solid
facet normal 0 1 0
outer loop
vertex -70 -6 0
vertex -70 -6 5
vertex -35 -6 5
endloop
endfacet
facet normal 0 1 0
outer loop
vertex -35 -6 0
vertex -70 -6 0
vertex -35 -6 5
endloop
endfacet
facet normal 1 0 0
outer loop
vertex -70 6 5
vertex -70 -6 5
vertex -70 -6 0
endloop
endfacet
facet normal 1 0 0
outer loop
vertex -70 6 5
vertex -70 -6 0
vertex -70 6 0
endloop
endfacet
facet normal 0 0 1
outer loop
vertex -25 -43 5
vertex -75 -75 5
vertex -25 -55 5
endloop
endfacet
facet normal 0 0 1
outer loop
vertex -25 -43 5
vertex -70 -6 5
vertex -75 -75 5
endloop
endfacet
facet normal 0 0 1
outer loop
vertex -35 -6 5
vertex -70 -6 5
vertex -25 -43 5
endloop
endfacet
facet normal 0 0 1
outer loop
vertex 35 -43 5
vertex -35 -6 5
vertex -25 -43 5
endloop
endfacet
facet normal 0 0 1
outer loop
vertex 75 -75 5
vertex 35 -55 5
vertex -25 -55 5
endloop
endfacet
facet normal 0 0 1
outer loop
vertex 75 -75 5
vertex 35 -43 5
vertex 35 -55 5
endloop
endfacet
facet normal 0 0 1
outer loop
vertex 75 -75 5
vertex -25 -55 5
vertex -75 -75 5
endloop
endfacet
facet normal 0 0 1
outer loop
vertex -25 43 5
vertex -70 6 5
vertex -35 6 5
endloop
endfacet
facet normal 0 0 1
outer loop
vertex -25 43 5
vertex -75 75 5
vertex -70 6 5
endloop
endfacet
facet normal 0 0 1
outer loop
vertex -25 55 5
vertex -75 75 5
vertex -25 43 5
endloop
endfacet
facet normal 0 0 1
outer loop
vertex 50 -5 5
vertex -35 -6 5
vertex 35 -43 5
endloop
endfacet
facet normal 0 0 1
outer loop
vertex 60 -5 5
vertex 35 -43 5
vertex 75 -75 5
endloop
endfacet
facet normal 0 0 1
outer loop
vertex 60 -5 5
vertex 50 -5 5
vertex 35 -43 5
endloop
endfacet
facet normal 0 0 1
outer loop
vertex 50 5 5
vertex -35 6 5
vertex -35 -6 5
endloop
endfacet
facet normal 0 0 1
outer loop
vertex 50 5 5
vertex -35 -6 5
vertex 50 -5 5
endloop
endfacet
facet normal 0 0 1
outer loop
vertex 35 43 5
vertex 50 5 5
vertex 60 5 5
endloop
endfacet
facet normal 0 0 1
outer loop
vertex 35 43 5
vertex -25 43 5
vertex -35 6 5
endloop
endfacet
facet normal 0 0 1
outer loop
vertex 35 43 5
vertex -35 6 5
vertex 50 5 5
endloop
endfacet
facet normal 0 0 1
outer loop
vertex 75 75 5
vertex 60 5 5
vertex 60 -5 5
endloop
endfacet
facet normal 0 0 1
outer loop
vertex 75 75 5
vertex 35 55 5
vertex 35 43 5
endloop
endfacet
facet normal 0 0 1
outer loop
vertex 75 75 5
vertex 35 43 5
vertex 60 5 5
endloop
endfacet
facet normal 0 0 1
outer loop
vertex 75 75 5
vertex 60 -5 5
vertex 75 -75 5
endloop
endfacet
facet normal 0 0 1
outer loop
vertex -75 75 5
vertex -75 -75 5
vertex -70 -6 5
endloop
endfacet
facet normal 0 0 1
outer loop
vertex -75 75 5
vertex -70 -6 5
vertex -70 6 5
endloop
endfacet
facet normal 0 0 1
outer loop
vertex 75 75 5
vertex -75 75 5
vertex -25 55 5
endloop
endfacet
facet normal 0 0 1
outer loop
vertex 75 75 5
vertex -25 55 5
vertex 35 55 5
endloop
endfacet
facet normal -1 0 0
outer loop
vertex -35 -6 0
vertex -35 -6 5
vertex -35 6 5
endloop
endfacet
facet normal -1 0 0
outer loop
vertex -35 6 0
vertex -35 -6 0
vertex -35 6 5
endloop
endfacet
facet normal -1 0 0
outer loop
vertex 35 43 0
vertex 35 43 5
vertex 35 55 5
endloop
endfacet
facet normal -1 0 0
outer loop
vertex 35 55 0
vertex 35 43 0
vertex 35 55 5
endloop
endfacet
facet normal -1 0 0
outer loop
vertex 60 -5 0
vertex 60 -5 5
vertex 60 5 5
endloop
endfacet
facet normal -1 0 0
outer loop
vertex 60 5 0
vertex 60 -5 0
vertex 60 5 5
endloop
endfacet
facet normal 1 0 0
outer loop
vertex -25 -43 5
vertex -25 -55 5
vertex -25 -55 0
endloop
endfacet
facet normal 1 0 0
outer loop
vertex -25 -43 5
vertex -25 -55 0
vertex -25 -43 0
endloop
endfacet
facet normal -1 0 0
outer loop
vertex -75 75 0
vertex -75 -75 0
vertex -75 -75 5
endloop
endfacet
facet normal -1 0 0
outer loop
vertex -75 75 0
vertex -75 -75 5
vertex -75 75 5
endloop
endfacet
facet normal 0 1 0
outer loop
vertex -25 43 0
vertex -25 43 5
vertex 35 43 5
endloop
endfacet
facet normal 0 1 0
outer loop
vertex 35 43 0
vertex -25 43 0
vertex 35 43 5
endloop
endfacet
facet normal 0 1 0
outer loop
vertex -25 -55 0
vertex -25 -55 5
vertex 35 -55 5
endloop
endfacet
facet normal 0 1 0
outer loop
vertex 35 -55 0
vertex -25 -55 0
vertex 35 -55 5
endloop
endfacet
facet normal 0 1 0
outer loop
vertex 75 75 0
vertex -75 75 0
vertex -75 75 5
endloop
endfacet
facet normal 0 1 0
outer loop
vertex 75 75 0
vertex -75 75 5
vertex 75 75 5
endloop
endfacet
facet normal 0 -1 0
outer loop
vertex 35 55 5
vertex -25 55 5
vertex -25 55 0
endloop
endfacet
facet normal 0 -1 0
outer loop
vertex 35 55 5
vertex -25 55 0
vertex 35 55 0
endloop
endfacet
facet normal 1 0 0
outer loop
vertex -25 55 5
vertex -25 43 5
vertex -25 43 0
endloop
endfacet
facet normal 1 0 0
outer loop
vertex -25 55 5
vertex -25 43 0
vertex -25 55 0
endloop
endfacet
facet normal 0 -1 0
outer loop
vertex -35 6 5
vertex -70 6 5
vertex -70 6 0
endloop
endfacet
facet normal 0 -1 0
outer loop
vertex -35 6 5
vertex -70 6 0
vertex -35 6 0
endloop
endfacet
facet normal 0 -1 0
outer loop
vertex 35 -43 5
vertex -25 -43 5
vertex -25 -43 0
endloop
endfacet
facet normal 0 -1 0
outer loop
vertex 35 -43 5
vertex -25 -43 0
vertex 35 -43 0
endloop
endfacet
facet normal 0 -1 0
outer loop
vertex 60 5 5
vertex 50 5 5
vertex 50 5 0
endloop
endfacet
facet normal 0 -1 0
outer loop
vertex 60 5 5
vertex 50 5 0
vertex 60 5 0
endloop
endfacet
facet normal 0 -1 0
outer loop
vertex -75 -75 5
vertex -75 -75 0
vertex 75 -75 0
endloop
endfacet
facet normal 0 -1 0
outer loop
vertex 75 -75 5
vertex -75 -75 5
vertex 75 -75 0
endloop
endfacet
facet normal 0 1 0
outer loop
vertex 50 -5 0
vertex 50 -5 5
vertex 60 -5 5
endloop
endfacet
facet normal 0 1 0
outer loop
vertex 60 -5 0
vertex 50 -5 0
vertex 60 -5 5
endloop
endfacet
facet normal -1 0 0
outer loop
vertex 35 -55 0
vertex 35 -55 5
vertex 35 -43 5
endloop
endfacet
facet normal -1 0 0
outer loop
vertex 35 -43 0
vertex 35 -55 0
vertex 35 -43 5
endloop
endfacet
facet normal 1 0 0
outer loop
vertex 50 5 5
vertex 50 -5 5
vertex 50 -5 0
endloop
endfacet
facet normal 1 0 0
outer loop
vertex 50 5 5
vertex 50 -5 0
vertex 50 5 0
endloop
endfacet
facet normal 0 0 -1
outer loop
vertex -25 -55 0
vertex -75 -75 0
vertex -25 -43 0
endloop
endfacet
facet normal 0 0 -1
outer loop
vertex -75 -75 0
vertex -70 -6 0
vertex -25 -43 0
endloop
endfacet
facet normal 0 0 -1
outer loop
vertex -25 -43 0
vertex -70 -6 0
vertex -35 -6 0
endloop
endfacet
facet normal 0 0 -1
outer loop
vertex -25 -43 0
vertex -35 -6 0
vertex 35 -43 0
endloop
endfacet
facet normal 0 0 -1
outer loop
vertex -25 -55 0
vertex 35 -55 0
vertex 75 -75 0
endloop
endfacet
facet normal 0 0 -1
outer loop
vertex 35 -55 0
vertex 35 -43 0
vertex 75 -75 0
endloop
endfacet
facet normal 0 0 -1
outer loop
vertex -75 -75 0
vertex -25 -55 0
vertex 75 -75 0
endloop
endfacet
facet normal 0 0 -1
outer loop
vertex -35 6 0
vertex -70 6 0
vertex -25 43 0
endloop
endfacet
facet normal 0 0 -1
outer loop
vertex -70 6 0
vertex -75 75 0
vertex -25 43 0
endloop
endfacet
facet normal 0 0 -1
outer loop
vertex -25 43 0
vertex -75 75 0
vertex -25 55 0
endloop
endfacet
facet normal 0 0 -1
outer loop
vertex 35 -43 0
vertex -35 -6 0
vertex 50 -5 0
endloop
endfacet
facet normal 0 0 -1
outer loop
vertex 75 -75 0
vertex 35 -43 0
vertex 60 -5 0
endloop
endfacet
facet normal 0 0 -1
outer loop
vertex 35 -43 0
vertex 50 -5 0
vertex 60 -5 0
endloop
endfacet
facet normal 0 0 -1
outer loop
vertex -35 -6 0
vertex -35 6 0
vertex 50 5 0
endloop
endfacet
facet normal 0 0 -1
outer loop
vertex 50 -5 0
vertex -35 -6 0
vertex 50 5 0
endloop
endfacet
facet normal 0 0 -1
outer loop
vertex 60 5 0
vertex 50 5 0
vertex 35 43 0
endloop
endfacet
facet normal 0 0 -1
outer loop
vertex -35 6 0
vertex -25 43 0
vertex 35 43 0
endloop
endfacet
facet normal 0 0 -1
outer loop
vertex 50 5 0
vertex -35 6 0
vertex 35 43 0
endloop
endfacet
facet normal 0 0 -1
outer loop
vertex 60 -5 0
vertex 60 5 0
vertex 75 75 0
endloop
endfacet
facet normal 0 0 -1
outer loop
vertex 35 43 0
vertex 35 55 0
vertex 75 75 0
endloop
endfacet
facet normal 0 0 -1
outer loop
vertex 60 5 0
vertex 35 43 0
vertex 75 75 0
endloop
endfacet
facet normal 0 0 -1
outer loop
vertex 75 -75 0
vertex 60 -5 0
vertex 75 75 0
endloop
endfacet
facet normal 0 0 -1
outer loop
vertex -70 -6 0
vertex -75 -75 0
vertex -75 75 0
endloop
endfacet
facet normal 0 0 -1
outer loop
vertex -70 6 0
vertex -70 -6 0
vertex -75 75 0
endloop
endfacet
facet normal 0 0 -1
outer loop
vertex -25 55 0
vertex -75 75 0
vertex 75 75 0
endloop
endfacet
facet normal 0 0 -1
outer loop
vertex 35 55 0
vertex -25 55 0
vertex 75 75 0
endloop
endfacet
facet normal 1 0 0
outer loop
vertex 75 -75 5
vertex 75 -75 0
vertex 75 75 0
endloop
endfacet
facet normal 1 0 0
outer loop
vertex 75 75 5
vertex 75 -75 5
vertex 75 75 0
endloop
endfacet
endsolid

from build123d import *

# Parameters (mm, degrees)
ESQUISSE2_W             = 150
ESQUISSE2_H             = 150
BOSS_EXTRU_1_DEPTH      = 5
ESQUISSE3_W             = 60
ESQUISSE3_H             = 12
ESQUISSE3_W_2           = 35
ENL_V_MAT_EXTRU_3_DEPTH = 107.183802908
ESQUISSE4_W             = 10
ESQUISSE4_H             = 10
ENL_V_MAT_EXTRU_4_DEPTH = 10


with BuildPart() as part:
    # Esquisse2 → Boss.-Extru.1 (new body)
    with BuildSketch(Plane.XY):
        Rectangle(ESQUISSE2_W, ESQUISSE2_H)
    extrude(amount=BOSS_EXTRU_1_DEPTH)

    # Esquisse3 → Enlèv. mat.-Extru.3 (cut, through all)
    with BuildSketch(Plane.XY.offset(5)):
        with Locations((5, 49)):
            Rectangle(ESQUISSE3_W, ESQUISSE3_H)
        with Locations((5, -49)):
            Rectangle(ESQUISSE3_W, ESQUISSE3_H)
        with Locations((-52.5, 0)):
            Rectangle(ESQUISSE3_W_2, ESQUISSE3_H)
    extrude(amount=-ENL_V_MAT_EXTRU_3_DEPTH, mode=Mode.SUBTRACT)

    # Esquisse4 → Enlèv. mat.-Extru.4 (cut)
    with BuildSketch(Plane.XY.offset(5)):
        with Locations((55, 0)):
            Rectangle(ESQUISSE4_W, ESQUISSE4_H)
    extrude(amount=-ENL_V_MAT_EXTRU_4_DEPTH, mode=Mode.SUBTRACT)


solid = part.part
